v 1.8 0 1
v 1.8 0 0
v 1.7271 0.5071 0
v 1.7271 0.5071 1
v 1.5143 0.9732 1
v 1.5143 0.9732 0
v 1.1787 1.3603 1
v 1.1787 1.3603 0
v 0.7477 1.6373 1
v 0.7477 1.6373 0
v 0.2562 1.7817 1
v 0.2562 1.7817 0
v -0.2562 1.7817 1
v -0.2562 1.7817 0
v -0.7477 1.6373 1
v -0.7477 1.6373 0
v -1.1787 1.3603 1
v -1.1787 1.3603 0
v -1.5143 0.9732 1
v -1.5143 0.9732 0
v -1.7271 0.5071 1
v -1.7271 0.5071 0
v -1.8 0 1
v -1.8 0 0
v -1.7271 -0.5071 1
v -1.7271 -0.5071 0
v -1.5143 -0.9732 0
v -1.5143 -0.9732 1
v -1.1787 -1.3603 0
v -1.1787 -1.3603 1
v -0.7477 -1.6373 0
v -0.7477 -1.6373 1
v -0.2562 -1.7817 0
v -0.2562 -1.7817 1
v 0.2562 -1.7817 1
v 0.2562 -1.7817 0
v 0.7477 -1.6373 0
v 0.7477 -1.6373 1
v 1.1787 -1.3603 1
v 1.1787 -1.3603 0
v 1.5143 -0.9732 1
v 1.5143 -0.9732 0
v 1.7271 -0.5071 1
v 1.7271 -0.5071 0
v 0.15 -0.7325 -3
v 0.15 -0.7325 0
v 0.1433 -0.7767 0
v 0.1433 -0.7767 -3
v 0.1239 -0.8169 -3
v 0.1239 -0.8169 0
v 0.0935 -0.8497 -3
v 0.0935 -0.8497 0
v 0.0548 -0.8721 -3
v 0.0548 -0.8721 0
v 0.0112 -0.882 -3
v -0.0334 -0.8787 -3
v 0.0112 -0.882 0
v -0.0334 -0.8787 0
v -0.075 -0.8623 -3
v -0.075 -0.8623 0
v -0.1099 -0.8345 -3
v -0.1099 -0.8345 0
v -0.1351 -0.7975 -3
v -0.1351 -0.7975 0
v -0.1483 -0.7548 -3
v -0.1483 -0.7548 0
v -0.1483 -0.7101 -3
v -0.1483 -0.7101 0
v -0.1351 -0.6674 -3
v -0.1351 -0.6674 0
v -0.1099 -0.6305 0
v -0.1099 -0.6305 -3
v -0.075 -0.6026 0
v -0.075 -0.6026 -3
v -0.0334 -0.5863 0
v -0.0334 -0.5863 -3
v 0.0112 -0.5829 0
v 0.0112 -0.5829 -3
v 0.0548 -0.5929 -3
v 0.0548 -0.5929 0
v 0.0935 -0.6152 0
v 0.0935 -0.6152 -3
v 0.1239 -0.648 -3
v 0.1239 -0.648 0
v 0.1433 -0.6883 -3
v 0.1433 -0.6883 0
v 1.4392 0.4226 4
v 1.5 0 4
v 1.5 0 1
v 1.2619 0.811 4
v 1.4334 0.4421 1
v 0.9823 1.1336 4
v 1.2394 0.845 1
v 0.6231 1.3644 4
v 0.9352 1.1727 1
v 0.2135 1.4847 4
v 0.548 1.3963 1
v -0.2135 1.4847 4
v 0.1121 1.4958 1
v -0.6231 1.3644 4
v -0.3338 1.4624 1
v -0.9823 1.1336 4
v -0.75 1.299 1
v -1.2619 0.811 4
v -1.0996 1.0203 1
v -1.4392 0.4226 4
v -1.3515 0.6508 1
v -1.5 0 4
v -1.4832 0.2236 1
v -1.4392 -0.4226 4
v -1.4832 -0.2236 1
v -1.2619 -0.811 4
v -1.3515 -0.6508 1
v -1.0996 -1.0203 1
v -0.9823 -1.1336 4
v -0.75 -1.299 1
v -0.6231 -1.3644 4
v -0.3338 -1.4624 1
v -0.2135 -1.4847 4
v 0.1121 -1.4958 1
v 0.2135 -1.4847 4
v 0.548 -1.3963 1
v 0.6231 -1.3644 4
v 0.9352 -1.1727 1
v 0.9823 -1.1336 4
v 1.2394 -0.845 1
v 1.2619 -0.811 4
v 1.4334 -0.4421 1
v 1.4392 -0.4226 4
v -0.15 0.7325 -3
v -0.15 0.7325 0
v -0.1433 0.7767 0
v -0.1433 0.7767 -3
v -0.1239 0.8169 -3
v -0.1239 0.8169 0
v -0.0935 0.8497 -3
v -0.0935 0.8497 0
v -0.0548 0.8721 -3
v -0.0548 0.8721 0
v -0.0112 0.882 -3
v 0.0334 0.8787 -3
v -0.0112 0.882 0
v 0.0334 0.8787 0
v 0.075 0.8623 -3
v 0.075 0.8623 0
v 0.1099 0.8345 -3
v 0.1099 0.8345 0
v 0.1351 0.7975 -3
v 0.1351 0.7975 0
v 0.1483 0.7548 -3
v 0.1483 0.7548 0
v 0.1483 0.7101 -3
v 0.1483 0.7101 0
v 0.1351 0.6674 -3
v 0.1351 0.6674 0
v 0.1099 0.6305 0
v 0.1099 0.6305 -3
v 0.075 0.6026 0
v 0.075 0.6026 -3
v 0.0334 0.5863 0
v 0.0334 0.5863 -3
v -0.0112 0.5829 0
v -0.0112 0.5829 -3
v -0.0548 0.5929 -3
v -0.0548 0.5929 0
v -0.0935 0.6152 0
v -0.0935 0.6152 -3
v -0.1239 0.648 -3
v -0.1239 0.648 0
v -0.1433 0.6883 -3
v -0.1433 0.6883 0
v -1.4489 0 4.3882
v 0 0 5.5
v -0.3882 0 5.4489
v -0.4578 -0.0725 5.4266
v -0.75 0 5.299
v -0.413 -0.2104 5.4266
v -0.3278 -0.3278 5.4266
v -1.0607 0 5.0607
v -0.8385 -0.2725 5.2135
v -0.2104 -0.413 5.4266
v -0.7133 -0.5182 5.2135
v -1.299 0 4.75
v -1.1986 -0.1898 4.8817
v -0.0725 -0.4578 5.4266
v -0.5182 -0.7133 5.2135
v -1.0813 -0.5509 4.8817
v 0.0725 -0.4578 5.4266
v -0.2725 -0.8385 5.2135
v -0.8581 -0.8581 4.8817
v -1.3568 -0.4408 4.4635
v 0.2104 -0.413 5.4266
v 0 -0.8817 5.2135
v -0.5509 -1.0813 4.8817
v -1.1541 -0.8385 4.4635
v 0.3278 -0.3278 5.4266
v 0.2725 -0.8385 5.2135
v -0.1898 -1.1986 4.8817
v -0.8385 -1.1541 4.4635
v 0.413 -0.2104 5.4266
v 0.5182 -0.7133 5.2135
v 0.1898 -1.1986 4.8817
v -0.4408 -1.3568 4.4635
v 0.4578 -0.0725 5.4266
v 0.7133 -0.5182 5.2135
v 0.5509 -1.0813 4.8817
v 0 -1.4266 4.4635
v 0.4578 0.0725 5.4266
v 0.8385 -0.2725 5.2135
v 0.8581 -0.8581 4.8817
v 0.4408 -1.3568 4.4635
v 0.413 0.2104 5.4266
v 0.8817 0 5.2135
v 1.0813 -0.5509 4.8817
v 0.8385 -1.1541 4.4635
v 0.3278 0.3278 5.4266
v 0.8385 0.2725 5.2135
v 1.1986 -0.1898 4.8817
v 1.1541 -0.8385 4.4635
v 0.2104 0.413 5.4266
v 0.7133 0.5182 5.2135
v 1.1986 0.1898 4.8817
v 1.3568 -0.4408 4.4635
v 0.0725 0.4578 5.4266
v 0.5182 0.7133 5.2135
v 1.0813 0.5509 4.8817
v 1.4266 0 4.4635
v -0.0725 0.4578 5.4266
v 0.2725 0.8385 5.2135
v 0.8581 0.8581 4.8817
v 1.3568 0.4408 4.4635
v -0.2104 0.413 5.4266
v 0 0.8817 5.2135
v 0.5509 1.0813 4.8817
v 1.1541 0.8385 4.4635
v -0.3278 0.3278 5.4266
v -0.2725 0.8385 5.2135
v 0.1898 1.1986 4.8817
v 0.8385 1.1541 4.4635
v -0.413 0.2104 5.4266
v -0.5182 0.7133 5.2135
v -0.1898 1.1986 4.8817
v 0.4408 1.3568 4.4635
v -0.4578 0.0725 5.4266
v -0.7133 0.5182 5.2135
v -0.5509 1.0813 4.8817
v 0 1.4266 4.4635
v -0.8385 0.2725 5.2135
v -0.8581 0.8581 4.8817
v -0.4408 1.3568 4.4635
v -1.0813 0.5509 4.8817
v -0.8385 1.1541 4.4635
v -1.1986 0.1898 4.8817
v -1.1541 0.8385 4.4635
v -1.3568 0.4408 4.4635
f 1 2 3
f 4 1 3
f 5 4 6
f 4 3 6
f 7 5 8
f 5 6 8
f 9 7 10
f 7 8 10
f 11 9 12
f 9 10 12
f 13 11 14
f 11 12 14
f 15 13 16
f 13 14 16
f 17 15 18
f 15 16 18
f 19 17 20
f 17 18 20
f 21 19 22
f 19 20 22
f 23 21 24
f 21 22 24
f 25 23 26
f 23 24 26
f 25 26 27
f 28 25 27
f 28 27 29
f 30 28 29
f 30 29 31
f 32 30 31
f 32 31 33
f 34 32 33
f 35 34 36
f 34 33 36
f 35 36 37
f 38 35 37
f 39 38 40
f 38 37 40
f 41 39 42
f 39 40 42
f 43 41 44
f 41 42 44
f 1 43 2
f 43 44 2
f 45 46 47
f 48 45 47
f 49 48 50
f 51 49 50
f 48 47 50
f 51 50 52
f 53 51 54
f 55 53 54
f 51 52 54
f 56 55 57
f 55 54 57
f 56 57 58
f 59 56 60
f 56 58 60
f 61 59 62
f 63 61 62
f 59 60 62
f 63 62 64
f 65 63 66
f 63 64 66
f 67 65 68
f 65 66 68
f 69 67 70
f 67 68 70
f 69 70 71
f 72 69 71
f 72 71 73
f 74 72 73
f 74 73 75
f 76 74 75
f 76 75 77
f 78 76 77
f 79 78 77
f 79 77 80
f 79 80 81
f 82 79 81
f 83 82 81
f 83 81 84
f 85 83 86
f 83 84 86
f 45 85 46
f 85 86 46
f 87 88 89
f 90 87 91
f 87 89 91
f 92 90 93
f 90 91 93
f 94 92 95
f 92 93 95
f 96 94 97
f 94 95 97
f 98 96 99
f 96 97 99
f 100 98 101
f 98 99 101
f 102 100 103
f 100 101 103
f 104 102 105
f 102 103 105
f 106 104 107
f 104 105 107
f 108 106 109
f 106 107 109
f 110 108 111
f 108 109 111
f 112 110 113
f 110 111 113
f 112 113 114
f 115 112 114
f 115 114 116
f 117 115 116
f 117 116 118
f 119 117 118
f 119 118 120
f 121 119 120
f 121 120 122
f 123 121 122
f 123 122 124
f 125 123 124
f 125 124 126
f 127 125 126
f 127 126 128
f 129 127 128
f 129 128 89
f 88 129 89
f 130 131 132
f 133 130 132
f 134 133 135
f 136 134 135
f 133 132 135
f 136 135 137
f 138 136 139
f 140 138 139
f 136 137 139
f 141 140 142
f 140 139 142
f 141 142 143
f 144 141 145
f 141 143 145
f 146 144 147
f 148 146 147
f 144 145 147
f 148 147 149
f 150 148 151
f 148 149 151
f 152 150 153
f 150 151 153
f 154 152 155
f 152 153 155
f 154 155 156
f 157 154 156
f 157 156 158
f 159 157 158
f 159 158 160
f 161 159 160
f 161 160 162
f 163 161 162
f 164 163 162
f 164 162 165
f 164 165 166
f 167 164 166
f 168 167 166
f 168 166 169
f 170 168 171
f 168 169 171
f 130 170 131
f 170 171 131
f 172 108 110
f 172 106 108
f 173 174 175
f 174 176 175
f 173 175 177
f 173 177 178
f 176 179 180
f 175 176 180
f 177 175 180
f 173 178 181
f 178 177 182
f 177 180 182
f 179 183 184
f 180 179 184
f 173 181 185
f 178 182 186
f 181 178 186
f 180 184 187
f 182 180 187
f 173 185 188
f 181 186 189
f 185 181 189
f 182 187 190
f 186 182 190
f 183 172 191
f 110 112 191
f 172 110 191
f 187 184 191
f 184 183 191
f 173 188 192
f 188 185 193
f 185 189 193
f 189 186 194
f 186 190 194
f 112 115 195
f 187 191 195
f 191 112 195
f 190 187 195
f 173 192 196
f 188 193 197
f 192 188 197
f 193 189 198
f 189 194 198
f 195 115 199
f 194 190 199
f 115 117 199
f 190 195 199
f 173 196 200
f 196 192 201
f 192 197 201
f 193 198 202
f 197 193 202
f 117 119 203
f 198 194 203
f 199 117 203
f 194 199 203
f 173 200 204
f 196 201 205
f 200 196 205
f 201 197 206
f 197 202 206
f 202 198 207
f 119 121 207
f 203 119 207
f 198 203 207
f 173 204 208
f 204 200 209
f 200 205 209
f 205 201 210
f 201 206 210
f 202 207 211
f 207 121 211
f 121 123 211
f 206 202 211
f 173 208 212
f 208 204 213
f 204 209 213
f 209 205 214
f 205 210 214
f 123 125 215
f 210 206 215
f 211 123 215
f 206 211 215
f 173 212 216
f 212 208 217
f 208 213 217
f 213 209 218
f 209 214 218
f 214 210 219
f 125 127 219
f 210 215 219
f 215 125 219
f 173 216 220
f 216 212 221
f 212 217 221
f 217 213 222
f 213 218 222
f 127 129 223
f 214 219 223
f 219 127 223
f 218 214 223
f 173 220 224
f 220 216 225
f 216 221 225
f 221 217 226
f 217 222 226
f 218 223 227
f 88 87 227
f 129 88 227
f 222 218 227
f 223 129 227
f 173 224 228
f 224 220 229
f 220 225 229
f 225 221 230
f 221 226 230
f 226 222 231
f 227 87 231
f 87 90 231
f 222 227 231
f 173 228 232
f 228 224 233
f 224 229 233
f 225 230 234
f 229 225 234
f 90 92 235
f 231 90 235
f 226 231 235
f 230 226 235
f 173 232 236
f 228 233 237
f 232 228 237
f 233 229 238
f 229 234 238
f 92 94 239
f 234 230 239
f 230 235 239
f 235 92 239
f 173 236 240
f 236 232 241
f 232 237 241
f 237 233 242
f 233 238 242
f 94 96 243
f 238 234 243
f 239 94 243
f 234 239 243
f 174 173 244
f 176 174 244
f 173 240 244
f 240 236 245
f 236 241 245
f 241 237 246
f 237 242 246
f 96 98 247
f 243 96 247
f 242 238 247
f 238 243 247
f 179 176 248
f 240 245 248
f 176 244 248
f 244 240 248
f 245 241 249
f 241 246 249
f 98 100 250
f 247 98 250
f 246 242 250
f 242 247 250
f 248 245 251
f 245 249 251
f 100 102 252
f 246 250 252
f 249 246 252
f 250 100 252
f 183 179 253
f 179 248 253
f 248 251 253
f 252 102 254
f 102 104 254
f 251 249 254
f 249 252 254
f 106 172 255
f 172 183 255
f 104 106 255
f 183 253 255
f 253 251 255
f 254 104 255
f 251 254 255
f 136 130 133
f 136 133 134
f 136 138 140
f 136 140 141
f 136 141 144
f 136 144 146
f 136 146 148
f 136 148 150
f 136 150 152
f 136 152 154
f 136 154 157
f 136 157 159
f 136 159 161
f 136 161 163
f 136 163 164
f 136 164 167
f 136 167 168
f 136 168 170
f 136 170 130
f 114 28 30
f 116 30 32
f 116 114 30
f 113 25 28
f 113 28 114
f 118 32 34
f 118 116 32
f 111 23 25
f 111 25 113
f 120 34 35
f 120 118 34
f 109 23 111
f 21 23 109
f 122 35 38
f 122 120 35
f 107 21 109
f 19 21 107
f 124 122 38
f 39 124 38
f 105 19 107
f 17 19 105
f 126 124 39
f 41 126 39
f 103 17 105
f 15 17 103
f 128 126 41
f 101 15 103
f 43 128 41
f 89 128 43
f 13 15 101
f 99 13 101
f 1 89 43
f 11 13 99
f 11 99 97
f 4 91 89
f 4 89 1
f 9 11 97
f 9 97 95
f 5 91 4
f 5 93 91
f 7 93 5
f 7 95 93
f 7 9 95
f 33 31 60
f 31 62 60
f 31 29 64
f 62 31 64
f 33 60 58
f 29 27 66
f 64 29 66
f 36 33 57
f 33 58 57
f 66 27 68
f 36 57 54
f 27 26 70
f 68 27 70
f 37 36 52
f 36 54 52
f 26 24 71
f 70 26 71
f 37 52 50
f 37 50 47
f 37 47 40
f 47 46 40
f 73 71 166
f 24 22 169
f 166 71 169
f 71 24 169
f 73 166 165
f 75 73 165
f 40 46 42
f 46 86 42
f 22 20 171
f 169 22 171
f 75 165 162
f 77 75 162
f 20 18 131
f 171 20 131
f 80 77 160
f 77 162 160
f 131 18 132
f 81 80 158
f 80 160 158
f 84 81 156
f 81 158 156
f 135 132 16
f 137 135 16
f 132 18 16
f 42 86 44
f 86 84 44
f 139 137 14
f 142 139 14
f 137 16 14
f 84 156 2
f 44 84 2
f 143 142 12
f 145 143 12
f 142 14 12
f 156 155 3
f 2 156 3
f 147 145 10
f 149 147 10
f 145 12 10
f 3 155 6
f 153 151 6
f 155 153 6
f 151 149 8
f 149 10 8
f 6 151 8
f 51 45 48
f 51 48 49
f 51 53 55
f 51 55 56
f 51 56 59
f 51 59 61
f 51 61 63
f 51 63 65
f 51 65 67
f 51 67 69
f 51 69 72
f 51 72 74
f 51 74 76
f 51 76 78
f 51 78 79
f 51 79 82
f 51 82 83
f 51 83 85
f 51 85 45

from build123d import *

# Parameters (mm, degrees)
ESQUISSE1_R                  = 1.8
BOSS_EXTRU_1_DEPTH           = 1
ESQUISSE2_R                  = 1.5
BOSS_EXTRU_2_DEPTH           = 3
ESQUISSE4_R                  = 0.14996248625265898
BOSS_EXTRU_3_DEPTH           = 3
R_P_TITION_CIRCULAIRE1_COUNT = 2


with BuildPart() as part:
    # Esquisse1 → Boss.-Extru.1 (new body)
    with BuildSketch(Plane.XY):
        Circle(ESQUISSE1_R)
    extrude(amount=BOSS_EXTRU_1_DEPTH)

    # Esquisse2 → Boss.-Extru.2 (add)
    with BuildSketch(Plane.XY.offset(1)):
        Circle(ESQUISSE2_R)
    extrude(amount=BOSS_EXTRU_2_DEPTH)

    # Esquisse4 → Boss.-Extru.3 (add)
    with BuildSketch(Plane(origin=(0, 0, 0), x_dir=(-1, 0, 0), z_dir=(0, 0, -1))):
        with Locations((0, -0.7324588375787755)):
            Circle(ESQUISSE4_R)
    boss_extru_3 = extrude(amount=BOSS_EXTRU_3_DEPTH)

    # Esquisse3 → Révolution7 (revolve)
    with BuildSketch(Plane(origin=(0, 0, 0), x_dir=(1, 0, 0), z_dir=(0, 1, 0))):
        with BuildLine():
            Line((0, -4), (-1.5000000000000002, -4))
            ThreePointArc((-1.5, -4), (-1.060660171779821, -5.060660171779822), (7e-17, -5.500000000000001))
            Line((0, -5.500000000000001), (0, -4))
        make_face()
    revolve(axis=Axis((0, 0, -0.2750000000000001), (0, 0, 1)))

    # Répétition circulaire1: Boss.-Extru.3 ×2 about axis
    r_p_tition_circulaire1_axis = Axis((0, 0, -0.2750000000000001), (0, 0, 1))
    for i in range(1, R_P_TITION_CIRCULAIRE1_COUNT):
        add(boss_extru_3.rotate(r_p_tition_circulaire1_axis, i * 360 / R_P_TITION_CIRCULAIRE1_COUNT))


solid = part.part
